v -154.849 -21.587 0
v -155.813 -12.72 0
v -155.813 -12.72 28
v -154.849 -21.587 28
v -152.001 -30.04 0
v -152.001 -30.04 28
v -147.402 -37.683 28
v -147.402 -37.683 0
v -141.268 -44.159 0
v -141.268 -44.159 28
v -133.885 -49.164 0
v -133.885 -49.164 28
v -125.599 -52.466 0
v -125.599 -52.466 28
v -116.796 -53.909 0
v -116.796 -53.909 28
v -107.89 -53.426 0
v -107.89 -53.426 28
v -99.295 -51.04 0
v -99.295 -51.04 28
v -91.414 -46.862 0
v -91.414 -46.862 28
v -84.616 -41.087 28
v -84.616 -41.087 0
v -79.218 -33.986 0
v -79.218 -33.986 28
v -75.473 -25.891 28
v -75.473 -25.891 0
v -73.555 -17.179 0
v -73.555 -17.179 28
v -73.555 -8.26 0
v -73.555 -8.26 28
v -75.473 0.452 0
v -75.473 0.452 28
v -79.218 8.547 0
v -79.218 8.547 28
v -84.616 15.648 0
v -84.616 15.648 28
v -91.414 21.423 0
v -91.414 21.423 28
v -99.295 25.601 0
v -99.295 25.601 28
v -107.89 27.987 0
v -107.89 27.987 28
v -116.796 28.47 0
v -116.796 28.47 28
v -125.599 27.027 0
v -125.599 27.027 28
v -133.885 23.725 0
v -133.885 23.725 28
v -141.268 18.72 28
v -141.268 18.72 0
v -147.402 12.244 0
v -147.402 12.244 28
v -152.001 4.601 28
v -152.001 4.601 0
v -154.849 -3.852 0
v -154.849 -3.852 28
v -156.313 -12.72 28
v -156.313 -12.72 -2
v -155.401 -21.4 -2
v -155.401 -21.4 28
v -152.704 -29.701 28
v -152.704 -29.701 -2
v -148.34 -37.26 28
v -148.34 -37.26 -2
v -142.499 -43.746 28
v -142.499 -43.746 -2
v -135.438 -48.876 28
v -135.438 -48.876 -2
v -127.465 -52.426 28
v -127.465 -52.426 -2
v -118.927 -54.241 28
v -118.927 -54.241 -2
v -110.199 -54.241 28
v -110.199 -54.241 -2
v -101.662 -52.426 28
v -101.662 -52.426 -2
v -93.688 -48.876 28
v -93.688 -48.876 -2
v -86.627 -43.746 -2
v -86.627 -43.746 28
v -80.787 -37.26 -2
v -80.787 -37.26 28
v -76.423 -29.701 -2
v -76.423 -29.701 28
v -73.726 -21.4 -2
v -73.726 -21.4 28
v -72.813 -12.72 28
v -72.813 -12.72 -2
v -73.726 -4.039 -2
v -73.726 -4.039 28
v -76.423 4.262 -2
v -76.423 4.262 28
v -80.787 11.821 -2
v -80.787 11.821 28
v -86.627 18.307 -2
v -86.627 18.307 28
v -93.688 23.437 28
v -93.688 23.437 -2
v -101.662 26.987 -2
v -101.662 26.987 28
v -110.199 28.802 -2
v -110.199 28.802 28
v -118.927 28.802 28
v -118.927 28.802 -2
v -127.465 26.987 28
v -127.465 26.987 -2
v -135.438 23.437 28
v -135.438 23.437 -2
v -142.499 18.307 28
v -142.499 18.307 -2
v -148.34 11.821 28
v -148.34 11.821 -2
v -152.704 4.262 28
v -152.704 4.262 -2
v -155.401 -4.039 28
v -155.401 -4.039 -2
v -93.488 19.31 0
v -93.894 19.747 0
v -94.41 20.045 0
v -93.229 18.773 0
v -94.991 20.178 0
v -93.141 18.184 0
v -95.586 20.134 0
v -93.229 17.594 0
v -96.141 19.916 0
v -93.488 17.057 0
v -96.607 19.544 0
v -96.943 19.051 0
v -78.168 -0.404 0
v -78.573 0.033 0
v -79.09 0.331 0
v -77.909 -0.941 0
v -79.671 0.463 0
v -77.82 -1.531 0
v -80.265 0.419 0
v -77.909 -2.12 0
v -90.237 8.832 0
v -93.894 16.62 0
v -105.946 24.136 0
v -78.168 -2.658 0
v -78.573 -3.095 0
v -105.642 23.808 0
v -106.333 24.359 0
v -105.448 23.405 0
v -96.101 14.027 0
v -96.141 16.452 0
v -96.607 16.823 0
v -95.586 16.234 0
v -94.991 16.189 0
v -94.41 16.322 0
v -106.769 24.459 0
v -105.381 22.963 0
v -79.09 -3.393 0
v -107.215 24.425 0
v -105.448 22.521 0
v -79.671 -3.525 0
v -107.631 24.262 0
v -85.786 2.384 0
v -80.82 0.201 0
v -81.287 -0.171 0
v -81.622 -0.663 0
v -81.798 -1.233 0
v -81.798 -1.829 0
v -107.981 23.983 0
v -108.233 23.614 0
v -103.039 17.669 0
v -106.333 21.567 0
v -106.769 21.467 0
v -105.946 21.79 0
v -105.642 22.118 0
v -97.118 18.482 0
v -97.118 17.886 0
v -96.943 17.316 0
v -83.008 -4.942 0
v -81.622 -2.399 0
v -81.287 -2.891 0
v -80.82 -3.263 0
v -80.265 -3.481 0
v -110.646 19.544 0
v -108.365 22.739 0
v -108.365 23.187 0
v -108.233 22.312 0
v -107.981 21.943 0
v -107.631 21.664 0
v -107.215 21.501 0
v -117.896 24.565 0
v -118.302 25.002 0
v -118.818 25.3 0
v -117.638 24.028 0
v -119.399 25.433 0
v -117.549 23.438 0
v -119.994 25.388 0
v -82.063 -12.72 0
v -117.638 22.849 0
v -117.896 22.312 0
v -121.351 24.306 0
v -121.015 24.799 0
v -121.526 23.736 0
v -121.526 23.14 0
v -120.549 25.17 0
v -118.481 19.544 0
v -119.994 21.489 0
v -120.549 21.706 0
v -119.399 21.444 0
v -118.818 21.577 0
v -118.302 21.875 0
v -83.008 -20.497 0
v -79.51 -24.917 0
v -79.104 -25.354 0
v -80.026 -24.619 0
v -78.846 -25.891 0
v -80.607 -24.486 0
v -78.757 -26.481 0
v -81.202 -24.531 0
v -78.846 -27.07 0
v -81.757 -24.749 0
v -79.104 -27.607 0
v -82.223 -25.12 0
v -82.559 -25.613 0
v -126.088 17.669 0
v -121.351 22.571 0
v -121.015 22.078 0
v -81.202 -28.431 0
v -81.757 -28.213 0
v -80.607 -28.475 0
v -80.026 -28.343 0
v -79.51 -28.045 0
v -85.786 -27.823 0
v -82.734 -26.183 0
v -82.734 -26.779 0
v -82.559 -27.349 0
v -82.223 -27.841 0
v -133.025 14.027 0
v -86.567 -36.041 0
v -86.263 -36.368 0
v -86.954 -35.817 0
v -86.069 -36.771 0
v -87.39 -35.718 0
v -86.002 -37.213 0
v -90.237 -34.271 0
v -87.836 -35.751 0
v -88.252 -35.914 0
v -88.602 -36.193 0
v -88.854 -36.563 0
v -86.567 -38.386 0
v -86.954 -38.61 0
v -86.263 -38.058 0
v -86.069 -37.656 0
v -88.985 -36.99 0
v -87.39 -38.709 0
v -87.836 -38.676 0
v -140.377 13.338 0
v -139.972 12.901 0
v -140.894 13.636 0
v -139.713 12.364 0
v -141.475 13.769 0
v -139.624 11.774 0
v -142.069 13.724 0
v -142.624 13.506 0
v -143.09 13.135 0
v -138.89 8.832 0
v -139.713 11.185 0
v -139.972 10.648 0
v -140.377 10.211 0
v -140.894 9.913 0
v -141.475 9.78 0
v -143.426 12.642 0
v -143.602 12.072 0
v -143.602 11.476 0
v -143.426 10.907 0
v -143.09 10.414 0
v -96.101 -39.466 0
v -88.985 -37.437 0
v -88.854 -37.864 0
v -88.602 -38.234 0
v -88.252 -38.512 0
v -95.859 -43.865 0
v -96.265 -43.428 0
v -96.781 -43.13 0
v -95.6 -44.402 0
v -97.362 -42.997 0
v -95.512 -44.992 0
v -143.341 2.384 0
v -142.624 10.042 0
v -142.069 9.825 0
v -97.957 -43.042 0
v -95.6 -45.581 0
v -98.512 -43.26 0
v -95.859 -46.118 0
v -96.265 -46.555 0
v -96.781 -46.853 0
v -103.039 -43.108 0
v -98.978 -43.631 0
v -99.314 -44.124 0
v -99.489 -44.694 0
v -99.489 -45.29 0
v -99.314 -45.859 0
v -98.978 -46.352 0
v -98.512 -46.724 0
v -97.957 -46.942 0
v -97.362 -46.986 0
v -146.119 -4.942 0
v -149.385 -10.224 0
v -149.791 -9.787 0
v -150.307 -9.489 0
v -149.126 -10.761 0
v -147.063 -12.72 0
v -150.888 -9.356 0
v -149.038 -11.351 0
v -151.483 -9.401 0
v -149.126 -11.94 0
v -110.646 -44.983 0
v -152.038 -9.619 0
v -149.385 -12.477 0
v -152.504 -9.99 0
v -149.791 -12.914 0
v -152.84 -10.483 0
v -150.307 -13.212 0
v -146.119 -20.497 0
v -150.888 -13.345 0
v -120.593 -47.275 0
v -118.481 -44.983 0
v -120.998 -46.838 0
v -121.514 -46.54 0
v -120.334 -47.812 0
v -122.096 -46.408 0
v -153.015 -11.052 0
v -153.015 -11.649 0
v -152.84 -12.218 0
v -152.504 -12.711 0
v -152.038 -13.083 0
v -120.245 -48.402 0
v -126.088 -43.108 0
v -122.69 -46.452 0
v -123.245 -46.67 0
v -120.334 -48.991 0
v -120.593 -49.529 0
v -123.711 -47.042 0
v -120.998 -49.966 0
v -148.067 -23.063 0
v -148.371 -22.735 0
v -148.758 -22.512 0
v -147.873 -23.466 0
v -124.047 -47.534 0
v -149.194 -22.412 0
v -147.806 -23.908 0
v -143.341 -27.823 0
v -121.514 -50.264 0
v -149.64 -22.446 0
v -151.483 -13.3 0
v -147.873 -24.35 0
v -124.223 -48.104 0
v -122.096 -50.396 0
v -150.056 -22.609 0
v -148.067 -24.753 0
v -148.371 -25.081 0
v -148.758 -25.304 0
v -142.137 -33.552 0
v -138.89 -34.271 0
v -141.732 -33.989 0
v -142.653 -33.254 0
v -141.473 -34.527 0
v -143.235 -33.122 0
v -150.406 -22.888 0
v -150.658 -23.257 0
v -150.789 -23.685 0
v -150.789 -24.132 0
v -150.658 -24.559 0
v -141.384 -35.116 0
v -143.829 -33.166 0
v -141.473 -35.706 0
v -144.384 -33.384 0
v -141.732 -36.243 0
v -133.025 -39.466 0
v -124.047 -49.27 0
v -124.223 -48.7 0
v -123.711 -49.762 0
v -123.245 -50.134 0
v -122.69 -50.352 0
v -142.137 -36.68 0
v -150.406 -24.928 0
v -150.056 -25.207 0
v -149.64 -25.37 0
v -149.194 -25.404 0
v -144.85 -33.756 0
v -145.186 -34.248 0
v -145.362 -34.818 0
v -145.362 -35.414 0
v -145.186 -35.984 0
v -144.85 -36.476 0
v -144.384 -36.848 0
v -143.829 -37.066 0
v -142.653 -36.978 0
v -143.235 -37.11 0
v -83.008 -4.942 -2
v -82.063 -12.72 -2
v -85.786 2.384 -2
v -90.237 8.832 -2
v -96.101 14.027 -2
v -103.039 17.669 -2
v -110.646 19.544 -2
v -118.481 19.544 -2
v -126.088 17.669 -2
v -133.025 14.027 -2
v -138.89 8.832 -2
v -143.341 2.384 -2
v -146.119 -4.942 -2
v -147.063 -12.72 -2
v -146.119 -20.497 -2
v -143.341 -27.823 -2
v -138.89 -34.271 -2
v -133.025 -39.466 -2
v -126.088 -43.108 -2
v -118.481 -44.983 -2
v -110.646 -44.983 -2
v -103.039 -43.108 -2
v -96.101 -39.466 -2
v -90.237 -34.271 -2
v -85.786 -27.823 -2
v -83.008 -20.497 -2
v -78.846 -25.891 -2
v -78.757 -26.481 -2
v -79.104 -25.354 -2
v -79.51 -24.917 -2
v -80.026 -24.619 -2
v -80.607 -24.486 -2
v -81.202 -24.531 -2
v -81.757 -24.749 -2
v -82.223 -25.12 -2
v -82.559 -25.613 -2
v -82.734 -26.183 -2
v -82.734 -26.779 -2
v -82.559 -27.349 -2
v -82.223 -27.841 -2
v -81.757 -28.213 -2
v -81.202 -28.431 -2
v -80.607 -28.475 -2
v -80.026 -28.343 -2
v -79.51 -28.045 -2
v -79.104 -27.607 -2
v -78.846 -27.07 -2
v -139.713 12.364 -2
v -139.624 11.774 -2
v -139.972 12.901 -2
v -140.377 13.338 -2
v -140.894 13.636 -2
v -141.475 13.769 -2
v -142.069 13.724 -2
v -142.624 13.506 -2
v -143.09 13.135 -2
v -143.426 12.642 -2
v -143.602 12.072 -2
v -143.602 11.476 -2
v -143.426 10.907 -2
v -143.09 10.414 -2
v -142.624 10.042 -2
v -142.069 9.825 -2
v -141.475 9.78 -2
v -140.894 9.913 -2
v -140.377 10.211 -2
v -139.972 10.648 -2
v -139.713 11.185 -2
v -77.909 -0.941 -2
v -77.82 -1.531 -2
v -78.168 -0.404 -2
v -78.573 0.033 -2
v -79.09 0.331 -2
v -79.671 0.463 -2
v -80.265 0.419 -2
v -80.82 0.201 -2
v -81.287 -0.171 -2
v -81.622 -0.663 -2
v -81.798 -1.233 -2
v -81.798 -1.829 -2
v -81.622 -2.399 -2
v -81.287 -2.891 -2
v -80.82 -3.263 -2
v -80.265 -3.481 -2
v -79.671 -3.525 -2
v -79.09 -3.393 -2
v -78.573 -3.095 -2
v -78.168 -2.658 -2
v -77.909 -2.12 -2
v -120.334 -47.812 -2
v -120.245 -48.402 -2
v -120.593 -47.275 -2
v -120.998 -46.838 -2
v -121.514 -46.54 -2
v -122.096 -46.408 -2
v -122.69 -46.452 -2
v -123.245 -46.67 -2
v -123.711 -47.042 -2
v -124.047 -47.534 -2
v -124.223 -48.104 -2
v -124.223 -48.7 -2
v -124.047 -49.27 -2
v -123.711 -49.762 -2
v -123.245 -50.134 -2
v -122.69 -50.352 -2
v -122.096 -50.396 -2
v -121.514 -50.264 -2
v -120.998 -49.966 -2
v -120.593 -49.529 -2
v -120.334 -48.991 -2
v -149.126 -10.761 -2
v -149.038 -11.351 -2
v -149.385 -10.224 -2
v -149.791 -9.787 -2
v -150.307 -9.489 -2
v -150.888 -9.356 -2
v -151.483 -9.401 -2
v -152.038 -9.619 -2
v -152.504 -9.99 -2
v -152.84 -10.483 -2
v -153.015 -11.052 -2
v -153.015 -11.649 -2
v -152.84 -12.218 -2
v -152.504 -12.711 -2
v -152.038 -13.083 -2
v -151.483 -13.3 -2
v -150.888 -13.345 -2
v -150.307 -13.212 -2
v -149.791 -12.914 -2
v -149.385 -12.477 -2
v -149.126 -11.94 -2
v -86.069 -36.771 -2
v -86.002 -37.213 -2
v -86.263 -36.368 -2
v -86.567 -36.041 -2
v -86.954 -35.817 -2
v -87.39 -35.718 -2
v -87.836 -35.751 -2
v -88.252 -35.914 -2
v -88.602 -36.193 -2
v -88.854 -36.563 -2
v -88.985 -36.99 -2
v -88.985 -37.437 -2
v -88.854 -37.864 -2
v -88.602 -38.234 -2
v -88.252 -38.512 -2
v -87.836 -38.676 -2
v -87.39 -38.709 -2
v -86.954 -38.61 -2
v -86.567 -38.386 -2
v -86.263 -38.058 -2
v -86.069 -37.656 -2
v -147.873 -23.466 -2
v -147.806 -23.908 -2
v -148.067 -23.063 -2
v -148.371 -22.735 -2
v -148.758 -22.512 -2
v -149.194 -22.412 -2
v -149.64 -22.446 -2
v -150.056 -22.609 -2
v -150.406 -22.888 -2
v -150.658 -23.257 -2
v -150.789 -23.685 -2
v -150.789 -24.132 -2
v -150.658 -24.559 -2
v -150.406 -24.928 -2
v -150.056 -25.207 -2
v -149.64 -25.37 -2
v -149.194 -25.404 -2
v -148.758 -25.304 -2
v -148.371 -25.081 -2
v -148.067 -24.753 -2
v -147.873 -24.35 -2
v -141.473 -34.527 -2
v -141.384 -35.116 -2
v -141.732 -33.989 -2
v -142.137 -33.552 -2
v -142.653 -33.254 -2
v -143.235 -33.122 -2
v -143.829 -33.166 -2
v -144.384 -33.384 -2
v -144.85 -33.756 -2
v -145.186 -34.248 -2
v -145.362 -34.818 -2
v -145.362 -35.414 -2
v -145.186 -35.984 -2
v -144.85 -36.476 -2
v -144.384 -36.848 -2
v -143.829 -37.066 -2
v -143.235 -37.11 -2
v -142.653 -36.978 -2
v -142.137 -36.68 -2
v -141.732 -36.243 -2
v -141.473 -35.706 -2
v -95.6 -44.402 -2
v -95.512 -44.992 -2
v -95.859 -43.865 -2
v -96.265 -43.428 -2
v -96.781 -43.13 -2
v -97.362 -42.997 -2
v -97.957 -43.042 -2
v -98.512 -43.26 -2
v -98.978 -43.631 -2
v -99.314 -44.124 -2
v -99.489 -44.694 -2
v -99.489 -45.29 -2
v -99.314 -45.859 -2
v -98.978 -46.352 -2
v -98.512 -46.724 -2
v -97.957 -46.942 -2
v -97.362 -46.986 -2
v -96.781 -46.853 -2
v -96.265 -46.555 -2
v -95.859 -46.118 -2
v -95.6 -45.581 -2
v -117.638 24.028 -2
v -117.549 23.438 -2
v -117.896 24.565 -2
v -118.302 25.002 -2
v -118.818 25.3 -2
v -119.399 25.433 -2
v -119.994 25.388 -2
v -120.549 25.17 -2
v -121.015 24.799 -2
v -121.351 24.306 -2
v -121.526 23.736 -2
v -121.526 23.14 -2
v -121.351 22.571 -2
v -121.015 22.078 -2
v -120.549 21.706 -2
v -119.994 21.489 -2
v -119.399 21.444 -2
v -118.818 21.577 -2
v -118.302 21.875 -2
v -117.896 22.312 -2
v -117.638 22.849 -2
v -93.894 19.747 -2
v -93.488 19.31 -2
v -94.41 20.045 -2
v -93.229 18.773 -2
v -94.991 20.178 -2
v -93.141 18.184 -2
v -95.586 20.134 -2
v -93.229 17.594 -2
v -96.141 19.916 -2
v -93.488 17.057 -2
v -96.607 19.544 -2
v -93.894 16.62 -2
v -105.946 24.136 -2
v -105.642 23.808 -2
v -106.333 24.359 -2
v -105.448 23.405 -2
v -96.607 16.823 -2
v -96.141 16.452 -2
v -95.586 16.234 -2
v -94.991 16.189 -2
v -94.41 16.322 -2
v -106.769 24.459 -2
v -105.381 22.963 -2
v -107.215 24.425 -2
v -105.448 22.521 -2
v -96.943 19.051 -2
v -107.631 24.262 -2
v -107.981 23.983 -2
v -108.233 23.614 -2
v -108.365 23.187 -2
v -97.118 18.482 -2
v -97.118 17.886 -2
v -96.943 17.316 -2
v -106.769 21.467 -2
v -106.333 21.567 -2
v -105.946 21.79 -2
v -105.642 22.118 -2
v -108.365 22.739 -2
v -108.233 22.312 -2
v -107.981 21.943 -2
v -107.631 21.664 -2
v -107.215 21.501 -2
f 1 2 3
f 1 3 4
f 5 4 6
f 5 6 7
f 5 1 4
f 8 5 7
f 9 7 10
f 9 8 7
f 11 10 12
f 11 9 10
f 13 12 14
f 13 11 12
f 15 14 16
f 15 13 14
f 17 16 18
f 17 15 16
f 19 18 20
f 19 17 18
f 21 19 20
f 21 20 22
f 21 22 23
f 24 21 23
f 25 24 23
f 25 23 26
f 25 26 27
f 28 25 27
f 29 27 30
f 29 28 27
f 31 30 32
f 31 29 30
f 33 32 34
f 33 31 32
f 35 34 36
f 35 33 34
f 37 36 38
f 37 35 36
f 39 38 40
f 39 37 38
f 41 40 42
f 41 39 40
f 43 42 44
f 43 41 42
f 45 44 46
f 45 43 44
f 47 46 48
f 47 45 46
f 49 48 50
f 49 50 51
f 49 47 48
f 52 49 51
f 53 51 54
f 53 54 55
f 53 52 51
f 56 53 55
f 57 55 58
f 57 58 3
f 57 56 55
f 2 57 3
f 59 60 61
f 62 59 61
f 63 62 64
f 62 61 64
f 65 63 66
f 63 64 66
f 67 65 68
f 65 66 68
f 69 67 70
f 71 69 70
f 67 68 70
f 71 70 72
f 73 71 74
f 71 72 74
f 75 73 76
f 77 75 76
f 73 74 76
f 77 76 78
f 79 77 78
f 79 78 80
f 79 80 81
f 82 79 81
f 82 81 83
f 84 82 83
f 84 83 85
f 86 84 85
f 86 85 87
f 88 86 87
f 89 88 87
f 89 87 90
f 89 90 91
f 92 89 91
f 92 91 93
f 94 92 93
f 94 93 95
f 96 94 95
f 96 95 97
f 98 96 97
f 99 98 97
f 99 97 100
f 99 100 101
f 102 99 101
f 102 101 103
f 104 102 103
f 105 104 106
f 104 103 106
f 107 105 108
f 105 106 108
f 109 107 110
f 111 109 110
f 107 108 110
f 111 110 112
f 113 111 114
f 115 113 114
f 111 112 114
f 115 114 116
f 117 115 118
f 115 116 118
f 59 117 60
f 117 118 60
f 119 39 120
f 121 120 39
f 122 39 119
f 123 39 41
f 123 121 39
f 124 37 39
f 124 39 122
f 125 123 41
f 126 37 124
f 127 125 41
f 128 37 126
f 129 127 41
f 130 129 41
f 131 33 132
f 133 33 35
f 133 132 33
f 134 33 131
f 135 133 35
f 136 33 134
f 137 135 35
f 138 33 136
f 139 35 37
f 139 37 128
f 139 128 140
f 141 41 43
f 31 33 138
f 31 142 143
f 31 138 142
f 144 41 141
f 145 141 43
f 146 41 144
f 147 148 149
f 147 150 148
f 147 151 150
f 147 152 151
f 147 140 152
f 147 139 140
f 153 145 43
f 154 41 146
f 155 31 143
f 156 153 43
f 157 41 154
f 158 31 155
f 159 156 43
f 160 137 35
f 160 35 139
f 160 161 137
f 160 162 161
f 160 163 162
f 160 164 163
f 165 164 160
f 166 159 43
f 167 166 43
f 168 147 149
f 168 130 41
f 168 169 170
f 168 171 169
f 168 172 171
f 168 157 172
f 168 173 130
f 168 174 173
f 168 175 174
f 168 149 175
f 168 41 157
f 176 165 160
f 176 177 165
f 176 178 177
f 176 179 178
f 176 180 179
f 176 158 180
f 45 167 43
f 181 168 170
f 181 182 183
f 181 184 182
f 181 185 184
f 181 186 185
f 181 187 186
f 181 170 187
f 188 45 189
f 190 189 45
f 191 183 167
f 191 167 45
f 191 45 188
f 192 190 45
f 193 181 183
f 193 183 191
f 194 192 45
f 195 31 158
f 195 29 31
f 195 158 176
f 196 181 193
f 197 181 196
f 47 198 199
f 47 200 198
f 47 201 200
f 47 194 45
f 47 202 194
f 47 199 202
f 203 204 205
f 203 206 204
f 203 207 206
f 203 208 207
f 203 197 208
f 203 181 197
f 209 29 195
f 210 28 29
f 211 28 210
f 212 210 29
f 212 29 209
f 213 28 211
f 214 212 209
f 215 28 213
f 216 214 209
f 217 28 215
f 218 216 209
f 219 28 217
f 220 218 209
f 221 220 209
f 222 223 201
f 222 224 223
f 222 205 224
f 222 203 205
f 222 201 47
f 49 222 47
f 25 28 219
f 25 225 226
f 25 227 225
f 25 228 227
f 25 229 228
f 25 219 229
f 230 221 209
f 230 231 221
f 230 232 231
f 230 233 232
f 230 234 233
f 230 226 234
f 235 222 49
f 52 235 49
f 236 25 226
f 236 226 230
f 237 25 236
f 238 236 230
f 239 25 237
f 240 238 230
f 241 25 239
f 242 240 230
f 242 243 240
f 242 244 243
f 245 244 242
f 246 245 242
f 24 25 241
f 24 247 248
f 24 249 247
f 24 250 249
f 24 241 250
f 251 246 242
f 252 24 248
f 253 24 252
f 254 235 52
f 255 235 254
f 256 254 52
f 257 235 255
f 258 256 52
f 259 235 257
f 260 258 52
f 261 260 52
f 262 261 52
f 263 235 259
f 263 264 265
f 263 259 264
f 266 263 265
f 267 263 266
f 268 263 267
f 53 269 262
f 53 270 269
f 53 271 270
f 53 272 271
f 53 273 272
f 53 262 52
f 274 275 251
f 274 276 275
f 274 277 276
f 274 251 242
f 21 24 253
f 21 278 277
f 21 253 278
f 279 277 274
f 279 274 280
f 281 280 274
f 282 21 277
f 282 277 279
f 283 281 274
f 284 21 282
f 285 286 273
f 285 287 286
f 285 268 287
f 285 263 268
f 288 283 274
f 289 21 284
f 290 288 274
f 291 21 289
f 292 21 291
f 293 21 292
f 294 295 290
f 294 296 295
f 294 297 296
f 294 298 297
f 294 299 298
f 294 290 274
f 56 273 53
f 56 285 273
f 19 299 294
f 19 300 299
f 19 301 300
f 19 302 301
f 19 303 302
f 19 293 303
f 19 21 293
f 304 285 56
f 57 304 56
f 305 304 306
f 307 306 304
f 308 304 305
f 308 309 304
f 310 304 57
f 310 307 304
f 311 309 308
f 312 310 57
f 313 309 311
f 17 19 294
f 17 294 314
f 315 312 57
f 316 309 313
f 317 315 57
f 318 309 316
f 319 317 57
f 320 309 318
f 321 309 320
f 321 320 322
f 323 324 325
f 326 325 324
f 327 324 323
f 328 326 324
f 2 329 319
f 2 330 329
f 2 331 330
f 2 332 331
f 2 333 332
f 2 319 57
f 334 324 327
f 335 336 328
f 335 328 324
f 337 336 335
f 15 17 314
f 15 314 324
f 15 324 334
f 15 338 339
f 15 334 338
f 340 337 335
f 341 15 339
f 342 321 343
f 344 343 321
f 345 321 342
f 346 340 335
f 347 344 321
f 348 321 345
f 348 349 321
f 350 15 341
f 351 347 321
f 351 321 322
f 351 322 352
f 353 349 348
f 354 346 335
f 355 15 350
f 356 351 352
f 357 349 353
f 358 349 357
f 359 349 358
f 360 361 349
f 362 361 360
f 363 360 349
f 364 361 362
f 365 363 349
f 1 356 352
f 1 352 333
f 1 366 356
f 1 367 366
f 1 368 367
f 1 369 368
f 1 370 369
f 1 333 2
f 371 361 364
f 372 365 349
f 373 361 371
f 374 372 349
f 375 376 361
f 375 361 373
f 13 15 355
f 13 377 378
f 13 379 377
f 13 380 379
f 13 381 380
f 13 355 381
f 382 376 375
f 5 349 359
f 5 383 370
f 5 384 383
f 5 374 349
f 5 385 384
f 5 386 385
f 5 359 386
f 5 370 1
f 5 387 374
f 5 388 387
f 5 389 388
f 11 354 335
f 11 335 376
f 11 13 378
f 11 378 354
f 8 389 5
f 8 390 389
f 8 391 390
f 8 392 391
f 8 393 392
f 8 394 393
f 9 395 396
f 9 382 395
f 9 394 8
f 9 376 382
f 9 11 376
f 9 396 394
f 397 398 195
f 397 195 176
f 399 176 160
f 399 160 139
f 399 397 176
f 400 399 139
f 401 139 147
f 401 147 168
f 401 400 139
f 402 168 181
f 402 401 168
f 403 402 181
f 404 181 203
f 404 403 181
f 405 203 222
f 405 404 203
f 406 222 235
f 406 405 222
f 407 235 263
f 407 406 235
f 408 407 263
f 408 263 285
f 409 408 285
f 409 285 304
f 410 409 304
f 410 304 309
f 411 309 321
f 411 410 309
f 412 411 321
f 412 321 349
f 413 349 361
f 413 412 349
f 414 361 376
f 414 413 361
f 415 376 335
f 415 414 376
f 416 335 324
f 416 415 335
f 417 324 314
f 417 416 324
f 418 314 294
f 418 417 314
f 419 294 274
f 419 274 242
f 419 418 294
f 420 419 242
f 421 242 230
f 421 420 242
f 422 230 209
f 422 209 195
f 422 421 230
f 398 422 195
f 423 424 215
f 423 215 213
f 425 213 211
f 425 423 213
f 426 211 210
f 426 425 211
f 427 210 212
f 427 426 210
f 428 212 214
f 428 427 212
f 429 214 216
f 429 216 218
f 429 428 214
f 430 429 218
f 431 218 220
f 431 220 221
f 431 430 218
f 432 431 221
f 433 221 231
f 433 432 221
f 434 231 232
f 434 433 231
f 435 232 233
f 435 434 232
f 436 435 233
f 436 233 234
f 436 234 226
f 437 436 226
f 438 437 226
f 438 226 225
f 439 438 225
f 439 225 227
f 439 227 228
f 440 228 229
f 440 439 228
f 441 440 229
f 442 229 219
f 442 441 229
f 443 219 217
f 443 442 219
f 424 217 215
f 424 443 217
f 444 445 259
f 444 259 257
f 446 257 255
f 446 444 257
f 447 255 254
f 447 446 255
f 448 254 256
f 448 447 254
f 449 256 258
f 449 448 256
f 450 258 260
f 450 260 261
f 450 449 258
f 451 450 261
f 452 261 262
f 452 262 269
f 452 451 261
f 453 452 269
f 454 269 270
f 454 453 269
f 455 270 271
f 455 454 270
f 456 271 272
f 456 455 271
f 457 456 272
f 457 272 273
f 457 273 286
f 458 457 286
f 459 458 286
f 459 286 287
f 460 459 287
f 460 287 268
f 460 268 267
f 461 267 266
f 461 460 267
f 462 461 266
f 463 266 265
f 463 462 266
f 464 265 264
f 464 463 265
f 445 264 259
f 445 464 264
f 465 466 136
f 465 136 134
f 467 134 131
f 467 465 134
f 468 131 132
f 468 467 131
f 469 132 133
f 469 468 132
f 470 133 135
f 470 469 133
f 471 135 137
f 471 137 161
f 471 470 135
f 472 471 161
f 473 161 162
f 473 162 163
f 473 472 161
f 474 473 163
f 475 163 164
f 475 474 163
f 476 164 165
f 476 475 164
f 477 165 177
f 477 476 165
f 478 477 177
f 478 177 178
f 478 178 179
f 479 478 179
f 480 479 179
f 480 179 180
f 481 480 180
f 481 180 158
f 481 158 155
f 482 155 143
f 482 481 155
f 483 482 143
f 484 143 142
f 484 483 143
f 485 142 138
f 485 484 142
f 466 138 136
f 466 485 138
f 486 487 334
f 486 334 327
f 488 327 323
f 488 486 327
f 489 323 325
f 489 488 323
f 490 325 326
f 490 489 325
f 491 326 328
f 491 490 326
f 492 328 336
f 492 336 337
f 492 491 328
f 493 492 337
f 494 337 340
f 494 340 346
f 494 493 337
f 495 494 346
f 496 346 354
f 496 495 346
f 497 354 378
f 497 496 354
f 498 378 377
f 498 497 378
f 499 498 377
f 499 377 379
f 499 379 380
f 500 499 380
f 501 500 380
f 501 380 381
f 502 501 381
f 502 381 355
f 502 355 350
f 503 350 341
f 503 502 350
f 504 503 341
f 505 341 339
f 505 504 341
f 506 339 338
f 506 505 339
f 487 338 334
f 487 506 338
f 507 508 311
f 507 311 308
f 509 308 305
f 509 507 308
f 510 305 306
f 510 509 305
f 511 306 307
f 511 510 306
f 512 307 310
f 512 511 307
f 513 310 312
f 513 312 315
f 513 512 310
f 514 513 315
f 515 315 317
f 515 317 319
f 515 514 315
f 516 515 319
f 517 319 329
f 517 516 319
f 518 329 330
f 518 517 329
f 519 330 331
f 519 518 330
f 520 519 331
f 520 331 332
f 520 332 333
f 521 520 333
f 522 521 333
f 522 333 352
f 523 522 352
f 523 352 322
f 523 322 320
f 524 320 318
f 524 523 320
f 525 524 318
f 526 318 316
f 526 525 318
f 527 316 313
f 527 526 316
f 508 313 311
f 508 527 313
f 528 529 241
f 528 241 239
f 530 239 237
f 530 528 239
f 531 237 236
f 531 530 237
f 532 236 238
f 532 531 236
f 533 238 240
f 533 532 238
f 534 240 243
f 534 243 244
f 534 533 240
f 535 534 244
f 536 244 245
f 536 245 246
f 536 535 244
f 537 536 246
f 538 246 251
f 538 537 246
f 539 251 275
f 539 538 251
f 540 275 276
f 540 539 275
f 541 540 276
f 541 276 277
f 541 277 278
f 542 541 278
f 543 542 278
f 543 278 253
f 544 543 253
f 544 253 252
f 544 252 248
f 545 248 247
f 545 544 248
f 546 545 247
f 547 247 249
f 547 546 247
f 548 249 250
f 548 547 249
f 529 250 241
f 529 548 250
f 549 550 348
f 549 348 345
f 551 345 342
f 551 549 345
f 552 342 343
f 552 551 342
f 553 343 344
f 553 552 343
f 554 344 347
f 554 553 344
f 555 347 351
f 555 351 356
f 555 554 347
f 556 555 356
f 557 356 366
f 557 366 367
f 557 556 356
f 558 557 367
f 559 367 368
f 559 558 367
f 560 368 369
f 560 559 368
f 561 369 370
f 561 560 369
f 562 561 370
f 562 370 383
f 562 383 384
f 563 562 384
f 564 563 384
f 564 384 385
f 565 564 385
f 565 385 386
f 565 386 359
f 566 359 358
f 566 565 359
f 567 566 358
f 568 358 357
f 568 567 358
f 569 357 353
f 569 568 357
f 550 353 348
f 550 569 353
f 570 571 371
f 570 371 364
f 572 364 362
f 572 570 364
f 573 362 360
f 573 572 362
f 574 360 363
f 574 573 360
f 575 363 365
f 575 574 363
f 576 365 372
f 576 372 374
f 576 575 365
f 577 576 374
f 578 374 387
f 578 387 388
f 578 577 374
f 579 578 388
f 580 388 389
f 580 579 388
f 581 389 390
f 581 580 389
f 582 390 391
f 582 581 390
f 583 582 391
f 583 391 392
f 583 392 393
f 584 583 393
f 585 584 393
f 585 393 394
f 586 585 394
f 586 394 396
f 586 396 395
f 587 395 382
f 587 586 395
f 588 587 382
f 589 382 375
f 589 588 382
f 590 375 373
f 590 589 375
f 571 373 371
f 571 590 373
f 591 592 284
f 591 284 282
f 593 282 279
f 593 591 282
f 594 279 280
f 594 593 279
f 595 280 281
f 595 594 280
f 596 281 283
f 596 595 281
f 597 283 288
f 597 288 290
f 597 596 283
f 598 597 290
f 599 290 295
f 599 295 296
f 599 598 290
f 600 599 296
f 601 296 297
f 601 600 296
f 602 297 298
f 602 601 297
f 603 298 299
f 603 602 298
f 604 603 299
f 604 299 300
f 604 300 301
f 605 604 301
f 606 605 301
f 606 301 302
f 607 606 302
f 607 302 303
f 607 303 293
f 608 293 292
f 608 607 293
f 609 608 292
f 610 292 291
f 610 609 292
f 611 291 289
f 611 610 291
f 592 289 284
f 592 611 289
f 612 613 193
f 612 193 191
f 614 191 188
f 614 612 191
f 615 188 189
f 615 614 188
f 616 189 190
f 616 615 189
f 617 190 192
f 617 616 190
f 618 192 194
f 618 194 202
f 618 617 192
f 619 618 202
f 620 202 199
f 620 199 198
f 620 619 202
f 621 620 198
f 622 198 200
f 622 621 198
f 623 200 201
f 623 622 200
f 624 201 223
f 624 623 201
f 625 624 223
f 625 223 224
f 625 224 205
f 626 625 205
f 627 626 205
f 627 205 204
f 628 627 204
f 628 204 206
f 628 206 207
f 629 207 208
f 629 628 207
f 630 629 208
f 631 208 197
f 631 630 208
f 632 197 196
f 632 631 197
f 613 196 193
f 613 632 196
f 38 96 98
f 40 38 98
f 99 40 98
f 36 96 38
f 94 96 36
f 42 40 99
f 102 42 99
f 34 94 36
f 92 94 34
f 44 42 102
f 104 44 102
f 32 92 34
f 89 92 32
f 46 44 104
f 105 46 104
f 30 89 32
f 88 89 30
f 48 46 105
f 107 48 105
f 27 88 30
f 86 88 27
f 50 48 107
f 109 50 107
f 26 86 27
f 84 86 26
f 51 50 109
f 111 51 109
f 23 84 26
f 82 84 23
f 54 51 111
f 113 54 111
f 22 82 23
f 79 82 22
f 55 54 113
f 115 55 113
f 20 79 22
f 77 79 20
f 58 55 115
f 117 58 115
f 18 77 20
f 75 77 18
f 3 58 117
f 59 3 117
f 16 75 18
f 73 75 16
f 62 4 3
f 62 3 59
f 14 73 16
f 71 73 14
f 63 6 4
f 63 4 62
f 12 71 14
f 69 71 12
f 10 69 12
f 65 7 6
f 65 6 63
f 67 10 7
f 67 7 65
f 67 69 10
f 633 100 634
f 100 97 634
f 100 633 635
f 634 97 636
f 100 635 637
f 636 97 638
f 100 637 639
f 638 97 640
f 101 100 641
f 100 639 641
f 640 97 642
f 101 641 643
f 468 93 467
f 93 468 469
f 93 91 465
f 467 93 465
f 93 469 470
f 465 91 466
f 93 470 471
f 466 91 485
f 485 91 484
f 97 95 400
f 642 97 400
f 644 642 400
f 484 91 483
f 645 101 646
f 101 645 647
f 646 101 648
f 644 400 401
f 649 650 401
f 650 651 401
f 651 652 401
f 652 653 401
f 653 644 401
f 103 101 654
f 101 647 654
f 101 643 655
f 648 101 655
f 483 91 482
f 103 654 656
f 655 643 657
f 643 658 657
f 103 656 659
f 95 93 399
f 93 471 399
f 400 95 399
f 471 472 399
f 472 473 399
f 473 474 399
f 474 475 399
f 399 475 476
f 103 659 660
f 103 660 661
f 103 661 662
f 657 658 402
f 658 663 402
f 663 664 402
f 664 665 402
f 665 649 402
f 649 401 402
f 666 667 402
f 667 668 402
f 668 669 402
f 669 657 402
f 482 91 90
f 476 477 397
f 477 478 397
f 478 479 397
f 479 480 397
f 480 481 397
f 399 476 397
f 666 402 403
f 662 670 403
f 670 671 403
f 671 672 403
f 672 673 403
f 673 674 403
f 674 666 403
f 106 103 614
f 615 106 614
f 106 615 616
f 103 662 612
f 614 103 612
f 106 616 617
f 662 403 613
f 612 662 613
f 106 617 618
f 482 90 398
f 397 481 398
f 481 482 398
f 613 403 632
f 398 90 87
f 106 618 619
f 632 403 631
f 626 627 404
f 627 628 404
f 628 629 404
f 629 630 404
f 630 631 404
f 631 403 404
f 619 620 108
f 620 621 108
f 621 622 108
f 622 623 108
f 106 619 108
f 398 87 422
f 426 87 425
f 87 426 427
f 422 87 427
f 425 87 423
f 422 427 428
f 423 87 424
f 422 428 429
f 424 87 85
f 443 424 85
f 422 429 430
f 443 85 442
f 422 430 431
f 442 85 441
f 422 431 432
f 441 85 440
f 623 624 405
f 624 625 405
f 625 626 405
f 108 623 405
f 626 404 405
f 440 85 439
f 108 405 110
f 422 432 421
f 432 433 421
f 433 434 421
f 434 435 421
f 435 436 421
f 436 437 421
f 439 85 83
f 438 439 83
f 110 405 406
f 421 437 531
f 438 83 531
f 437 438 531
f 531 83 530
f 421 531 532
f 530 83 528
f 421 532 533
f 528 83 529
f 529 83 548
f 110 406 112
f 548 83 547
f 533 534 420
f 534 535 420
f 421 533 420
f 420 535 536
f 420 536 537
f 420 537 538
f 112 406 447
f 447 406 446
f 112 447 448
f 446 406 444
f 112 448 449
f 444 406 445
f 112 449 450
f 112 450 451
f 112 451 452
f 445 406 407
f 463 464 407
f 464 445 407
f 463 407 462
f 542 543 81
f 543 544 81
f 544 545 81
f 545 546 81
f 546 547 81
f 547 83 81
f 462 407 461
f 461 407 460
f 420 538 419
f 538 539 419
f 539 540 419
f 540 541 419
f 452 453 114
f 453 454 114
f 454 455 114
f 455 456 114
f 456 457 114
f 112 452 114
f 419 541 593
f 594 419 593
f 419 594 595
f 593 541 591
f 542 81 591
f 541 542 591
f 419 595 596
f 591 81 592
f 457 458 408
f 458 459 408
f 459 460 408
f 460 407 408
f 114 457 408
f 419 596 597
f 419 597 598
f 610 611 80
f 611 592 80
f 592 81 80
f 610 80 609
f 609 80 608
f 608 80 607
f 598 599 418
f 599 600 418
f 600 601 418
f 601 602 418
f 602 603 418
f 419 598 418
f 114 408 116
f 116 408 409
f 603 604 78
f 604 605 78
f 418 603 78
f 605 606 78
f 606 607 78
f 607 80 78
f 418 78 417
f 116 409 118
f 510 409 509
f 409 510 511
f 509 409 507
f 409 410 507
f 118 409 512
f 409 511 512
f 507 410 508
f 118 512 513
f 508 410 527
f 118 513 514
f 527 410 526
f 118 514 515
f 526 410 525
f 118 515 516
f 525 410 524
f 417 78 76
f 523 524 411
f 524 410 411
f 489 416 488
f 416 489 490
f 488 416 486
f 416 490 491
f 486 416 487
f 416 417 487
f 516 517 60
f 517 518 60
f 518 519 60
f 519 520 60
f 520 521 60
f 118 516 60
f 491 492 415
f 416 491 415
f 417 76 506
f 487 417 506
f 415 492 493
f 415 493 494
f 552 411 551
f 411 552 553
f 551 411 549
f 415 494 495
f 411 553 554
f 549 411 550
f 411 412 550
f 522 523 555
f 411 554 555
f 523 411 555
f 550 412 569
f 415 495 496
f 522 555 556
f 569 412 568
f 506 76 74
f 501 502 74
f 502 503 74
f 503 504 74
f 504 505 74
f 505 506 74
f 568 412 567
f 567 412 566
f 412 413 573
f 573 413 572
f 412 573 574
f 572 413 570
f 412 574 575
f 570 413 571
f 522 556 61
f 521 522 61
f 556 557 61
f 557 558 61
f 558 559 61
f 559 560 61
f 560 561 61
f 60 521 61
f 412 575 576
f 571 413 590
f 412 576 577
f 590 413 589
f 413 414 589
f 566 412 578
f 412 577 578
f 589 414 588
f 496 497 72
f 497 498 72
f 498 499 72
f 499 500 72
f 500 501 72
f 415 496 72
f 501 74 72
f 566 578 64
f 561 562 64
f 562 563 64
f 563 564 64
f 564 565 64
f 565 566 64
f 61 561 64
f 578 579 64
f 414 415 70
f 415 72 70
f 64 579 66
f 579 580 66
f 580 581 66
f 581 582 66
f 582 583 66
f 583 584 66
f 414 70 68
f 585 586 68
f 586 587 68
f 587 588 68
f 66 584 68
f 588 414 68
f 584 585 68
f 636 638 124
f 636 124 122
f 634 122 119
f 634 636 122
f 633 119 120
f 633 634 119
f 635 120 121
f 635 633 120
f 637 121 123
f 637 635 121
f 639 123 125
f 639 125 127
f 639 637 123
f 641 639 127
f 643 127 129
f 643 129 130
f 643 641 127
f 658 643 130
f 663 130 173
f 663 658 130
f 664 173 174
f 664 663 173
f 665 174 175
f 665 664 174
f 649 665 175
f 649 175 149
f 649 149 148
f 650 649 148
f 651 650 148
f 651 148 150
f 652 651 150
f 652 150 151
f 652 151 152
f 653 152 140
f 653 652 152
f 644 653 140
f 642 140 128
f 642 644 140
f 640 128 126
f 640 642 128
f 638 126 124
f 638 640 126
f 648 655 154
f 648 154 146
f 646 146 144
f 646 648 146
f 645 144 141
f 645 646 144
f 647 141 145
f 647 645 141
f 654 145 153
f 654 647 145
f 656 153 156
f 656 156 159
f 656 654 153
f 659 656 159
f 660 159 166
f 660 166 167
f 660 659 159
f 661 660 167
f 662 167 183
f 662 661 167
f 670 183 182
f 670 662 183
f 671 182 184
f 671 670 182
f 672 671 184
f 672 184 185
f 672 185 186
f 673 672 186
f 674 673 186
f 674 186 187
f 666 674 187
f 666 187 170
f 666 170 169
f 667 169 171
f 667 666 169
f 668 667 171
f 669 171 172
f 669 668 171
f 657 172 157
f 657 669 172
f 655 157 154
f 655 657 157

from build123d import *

# Parameters (mm, degrees)
SKETCH2_R           = 41.75
SKETCH2_R_2         = 41.25
BOSS_EXTRUDE1_DEPTH = 28
BOSS_EXTRUDE2_START = -2
SKETCH2_3_R         = 41.75
SKETCH2_3_R_2       = 2
SKETCH2_3_R_3       = 1.5
SKETCH2_3_R_4       = 32.5
BOSS_EXTRUDE2_DEPTH = 2


with BuildPart() as part:
    # Sketch2 → Boss-Extrude1 (new body)
    with BuildSketch(Plane.XY):
        with Locations(Location((-114.563267105, -12.719508093, 0), (0, 0, 180))):
            Circle(SKETCH2_R)
        with Locations(Location((-114.563267105, -12.719508093, 0), (0, 0, 180))):
            Circle(SKETCH2_R_2, mode=Mode.SUBTRACT)
    extrude(amount=BOSS_EXTRUDE1_DEPTH)

    # Sketch2<3> → Boss-Extrude2 (add)
    with BuildSketch(Plane.XY.offset(BOSS_EXTRUDE2_START)):
        with Locations(Location((-114.563267105, -12.719508093, 0), (0, 0, 180))):
            Circle(SKETCH2_3_R)
        with Locations((-143.38415281, -35.116082543)):
            Circle(SKETCH2_3_R_2, mode=Mode.SUBTRACT)
        with Locations((-122.245105889, -48.401987728)):
            Circle(SKETCH2_3_R_2, mode=Mode.SUBTRACT)
        with Locations((-149.30612033, -23.908080375)):
            Circle(SKETCH2_3_R_3, mode=Mode.SUBTRACT)
        with Locations((-97.511641226, -44.991664124)):
            Circle(SKETCH2_3_R_2, mode=Mode.SUBTRACT)
        with Locations((-87.502252663, -37.213415445)):
            Circle(SKETCH2_3_R_3, mode=Mode.SUBTRACT)
        with Locations((-80.756821819, -26.480840048)):
            Circle(SKETCH2_3_R_2, mode=Mode.SUBTRACT)
        with Locations((-151.037587002, -11.350571264)):
            Circle(SKETCH2_3_R_2, mode=Mode.SUBTRACT)
        with Locations((-141.624281546, 11.77439926)):
            Circle(SKETCH2_3_R_2, mode=Mode.SUBTRACT)
        with Locations((-119.548826684, 23.438398314)):
            Circle(SKETCH2_3_R_2, mode=Mode.SUBTRACT)
        with Locations((-114.563267105, -12.719508093)):
            Circle(SKETCH2_3_R_4, mode=Mode.SUBTRACT)
        with Locations((-79.820413879, -1.53093581)):
            Circle(SKETCH2_3_R_2, mode=Mode.SUBTRACT)
        with Locations((-95.140573086, 18.183711109)):
            Circle(SKETCH2_3_R_2, mode=Mode.SUBTRACT)
        with Locations((-106.88142832, 22.962971542)):
            Circle(SKETCH2_3_R_3, mode=Mode.SUBTRACT)
    extrude(amount=BOSS_EXTRUDE2_DEPTH)


solid = part.part
